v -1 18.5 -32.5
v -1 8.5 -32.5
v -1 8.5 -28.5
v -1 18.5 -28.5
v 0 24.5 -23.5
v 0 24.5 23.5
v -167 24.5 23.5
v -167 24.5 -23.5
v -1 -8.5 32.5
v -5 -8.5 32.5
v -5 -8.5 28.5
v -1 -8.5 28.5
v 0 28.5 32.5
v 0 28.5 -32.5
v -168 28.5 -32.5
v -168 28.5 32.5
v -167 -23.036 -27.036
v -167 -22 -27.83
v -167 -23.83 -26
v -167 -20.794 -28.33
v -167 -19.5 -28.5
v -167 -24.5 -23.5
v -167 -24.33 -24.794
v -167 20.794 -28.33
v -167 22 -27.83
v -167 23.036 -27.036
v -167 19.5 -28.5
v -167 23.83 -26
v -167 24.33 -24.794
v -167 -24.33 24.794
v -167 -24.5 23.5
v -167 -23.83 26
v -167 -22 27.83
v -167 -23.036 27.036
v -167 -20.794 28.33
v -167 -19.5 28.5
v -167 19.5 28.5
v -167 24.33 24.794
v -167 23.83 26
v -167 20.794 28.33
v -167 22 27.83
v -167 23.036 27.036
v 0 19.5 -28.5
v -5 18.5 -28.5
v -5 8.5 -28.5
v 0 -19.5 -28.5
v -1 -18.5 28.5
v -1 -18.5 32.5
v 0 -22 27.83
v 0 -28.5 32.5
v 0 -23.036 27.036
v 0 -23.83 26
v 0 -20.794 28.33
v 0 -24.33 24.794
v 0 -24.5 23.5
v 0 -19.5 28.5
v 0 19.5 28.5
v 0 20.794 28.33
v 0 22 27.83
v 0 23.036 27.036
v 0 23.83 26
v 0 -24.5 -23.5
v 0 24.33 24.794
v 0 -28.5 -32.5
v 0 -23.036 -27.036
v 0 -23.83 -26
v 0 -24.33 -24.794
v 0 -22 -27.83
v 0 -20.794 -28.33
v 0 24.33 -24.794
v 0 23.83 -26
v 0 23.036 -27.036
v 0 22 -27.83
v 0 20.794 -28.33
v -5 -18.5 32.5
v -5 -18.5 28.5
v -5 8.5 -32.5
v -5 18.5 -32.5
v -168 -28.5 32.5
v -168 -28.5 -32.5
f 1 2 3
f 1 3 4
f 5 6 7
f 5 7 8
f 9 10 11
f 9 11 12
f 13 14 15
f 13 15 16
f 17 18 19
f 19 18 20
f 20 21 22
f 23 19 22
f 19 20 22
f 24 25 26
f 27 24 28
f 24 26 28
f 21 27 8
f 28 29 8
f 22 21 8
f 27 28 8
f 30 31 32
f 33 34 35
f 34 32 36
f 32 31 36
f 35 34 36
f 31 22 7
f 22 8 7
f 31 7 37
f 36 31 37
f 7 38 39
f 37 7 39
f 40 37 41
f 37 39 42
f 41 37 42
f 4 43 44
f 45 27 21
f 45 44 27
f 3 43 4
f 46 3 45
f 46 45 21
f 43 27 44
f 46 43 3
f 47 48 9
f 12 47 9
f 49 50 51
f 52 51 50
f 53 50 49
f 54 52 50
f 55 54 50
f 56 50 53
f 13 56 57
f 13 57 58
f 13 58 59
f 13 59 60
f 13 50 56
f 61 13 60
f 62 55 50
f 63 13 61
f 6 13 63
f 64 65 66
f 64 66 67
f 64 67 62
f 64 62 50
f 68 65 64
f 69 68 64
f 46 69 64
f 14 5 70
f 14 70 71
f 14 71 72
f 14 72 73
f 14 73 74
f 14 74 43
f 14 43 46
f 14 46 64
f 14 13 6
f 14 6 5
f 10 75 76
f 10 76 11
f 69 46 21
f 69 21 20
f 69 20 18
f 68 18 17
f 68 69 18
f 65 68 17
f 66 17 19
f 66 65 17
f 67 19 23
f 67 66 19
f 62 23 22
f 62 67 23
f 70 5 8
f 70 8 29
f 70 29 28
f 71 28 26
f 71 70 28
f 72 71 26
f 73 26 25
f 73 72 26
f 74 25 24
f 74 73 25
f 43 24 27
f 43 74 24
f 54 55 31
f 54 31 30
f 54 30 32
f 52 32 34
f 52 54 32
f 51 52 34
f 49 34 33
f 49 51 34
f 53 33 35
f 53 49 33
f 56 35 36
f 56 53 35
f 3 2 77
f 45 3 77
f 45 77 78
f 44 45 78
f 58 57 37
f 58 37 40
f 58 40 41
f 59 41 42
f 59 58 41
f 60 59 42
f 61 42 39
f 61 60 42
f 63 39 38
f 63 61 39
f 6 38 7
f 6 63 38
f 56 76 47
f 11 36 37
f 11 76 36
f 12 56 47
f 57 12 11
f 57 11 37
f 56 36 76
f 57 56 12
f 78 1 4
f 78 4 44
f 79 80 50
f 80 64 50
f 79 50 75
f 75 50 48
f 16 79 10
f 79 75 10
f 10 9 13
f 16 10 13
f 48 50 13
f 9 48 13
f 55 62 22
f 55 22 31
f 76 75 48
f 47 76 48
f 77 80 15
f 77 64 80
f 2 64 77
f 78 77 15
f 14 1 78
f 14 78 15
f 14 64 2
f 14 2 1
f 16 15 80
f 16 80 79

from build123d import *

# Parameters (mm, degrees)
SKETCH_1_W          = 65
SKETCH_1_H          = 57
EXTRUDE_1_DEPTH     = 167
SKETCH_2_W          = 4
SKETCH_2_H          = 10
CUT_EXTRUDE_1_DEPTH = 10
SKETCH_3_W          = 65
SKETCH_3_H          = 57
EXTRUDE_2_DEPTH     = 1
SKETCH_4_W          = 4
SKETCH_4_H          = 10
CUT_EXTRUDE_2_DEPTH = 10


with BuildPart() as part:
    # Эскиз1 → Бобышка-Вытянуть1 (new body)
    with BuildSketch(Plane(origin=(0, 0, 0), x_dir=(0, 0, -1), z_dir=(1, 0, 0))):
        Rectangle(SKETCH_1_W, SKETCH_1_H)
        with BuildLine():
            Line((23.5, -24.5), (-23.5, -24.5))
            ThreePointArc((-23.5, -24.5), (-27.035533906, -23.035533906), (-28.5, -19.5))
            Line((-28.5, -19.5), (-28.5, 19.5))
            ThreePointArc((-28.5, 19.5), (-27.035533906, 23.035533906), (-23.5, 24.5))
            Line((-23.5, 24.5), (23.5, 24.5))
            ThreePointArc((23.5, 24.5), (27.035533906, 23.035533906), (28.5, 19.5))
            Line((28.5, 19.5), (28.5, -19.5))
            ThreePointArc((28.5, -19.5), (27.035533906, -23.035533906), (23.5, -24.5))
        make_face(mode=Mode.SUBTRACT)
    extrude(amount=-EXTRUDE_1_DEPTH)

    # Эскиз2 → Вырез-Вытянуть1 (cut)
    with BuildSketch(Plane.XY.offset(32.5)):
        with Locations((-3, -13.5)):
            Rectangle(SKETCH_2_W, SKETCH_2_H)
    extrude(amount=-CUT_EXTRUDE_1_DEPTH, mode=Mode.SUBTRACT)

    # Эскиз3 → Бобышка-Вытянуть2 (add)
    with BuildSketch(Plane.ZY.offset(167)):
        Rectangle(SKETCH_3_W, SKETCH_3_H)
    extrude(amount=EXTRUDE_2_DEPTH)

    # Эскиз4 → Вырез-Вытянуть2 (cut)
    with BuildSketch(Plane(origin=(0, 0, -32.5), x_dir=(-1, 0, 0), z_dir=(0, 0, -1))):
        with Locations((3, 13.5)):
            Rectangle(SKETCH_4_W, SKETCH_4_H)
    extrude(amount=-CUT_EXTRUDE_2_DEPTH, mode=Mode.SUBTRACT)


solid = part.part
